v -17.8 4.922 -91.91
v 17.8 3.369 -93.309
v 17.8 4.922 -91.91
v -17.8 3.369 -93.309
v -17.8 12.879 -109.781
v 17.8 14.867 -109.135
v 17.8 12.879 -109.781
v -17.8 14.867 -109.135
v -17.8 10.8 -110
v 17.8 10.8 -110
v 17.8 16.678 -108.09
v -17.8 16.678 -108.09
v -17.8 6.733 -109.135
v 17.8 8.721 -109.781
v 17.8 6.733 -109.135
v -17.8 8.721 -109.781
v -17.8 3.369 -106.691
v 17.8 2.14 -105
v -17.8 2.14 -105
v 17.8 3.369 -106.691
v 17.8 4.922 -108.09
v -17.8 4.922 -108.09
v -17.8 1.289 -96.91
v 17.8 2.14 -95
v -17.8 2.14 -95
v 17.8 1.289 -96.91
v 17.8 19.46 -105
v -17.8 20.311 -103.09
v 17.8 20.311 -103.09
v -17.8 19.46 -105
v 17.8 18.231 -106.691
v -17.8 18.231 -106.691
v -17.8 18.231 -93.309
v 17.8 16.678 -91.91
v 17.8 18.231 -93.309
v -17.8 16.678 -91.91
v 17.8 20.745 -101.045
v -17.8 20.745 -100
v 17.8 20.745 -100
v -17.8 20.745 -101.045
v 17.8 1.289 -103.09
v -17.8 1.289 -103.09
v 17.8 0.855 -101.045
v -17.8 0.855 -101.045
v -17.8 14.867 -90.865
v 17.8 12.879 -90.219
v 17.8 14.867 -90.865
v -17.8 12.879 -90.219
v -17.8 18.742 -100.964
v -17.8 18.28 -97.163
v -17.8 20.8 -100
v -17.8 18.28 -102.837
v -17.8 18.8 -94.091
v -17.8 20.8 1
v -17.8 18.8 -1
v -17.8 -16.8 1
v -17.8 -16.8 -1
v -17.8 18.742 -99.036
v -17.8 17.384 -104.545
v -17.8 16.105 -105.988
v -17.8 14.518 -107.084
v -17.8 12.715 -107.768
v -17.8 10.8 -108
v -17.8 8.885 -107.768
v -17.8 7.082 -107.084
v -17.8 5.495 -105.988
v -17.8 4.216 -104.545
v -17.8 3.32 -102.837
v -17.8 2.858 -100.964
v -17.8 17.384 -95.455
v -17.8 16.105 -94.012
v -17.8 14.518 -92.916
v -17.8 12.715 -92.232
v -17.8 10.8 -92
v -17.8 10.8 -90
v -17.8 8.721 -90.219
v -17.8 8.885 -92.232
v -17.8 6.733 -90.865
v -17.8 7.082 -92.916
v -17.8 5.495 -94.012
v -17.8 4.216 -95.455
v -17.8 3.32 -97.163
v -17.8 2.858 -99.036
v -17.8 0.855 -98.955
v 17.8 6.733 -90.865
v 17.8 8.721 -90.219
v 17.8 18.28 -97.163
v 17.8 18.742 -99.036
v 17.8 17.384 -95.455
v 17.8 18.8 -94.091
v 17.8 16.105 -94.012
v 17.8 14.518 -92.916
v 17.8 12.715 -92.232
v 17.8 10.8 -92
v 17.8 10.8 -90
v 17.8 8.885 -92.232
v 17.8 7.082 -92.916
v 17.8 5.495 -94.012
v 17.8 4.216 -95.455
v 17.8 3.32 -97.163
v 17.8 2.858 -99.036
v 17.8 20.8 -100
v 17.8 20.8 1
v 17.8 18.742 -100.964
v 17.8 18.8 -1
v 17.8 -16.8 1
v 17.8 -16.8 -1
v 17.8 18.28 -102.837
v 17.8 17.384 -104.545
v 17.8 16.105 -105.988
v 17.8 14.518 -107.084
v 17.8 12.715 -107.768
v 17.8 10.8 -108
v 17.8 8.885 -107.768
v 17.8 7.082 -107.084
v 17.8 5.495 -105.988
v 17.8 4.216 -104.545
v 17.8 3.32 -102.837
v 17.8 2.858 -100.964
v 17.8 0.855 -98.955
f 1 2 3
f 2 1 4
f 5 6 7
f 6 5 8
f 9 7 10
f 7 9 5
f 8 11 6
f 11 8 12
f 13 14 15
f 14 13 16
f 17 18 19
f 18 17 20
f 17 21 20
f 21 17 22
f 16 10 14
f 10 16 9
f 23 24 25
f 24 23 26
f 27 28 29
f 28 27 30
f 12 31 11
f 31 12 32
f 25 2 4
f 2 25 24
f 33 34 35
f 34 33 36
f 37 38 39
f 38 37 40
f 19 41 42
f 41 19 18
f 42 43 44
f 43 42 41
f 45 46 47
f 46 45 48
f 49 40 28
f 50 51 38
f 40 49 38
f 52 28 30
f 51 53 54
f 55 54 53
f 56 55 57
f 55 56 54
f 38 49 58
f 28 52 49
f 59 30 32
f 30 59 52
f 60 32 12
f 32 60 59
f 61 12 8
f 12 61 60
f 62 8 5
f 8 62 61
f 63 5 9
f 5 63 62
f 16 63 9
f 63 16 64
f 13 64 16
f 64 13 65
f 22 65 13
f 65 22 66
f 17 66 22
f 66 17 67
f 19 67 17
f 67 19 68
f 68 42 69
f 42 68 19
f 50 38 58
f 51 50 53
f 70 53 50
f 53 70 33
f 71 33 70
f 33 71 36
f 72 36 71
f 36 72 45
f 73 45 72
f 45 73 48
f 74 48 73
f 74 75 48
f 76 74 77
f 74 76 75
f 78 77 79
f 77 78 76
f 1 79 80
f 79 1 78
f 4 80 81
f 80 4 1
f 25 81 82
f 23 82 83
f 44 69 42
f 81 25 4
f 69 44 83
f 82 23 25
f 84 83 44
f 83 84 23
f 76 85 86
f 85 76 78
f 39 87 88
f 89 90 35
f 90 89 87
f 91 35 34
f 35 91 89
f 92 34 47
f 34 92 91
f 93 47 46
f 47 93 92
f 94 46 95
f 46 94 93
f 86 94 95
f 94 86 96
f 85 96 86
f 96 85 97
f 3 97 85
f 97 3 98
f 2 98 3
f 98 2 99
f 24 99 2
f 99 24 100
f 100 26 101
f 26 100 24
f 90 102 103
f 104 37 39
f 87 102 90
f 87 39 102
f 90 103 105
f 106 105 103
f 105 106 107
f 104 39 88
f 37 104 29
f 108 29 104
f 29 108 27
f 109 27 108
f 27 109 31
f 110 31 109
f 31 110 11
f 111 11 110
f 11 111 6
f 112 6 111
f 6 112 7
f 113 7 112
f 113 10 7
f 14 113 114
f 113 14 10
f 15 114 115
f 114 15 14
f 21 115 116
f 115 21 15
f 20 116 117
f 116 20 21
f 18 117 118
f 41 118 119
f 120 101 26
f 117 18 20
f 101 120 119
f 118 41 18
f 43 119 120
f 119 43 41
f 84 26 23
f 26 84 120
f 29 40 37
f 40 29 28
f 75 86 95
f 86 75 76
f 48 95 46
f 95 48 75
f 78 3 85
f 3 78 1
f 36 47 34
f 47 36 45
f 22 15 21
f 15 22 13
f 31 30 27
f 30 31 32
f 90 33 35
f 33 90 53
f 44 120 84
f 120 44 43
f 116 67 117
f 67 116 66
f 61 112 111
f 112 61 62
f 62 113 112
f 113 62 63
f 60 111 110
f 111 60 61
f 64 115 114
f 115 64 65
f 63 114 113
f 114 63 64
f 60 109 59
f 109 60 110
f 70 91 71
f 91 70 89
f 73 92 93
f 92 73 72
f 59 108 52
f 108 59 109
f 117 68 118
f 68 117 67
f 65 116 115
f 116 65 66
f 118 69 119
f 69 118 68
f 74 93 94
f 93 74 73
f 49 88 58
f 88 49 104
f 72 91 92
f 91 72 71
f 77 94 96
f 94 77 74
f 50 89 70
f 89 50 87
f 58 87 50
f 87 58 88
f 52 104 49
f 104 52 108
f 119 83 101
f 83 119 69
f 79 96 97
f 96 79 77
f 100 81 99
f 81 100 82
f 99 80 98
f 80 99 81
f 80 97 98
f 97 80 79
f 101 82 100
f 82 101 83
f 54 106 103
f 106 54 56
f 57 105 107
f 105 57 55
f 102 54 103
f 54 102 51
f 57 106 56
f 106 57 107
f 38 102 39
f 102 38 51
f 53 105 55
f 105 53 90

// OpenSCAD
// file: ../models/mx28-values.scad
MX28Width = 35.6;
MX28Height = 50.6;
MX28Depth = 35.5;
MX28ShaftOffset = 12.5;
// main file
Collisions = false;
include <../models/mx28-values.scad>;

//:Part
module mx28_l(mode="arm", length=100, thickness=2, armSize=20)
{
    translate([0,thickness,0])
    cube([MX28Width,MX28Width+thickness,thickness], center=true);
    
    translate([0,MX28Width/2+thickness,-length/2])
        cube([MX28Width,thickness,length], center=true);
    
    if (mode == "arm") {
        translate([0,MX28Width/2+thickness/2+thickness-armSize/2,-length]) {
            rotate([0,0,-90]) {
                //:Tip
            }
            rotate([0,90,0])
            difference() {
                cylinder(d=armSize, h=MX28Width, center=true);
                if (!Collisions) {
                    cylinder(d=armSize-thickness*2, h=1+MX28Width, center=true);
                }
            }
        }
    }
}

mx28_l();
